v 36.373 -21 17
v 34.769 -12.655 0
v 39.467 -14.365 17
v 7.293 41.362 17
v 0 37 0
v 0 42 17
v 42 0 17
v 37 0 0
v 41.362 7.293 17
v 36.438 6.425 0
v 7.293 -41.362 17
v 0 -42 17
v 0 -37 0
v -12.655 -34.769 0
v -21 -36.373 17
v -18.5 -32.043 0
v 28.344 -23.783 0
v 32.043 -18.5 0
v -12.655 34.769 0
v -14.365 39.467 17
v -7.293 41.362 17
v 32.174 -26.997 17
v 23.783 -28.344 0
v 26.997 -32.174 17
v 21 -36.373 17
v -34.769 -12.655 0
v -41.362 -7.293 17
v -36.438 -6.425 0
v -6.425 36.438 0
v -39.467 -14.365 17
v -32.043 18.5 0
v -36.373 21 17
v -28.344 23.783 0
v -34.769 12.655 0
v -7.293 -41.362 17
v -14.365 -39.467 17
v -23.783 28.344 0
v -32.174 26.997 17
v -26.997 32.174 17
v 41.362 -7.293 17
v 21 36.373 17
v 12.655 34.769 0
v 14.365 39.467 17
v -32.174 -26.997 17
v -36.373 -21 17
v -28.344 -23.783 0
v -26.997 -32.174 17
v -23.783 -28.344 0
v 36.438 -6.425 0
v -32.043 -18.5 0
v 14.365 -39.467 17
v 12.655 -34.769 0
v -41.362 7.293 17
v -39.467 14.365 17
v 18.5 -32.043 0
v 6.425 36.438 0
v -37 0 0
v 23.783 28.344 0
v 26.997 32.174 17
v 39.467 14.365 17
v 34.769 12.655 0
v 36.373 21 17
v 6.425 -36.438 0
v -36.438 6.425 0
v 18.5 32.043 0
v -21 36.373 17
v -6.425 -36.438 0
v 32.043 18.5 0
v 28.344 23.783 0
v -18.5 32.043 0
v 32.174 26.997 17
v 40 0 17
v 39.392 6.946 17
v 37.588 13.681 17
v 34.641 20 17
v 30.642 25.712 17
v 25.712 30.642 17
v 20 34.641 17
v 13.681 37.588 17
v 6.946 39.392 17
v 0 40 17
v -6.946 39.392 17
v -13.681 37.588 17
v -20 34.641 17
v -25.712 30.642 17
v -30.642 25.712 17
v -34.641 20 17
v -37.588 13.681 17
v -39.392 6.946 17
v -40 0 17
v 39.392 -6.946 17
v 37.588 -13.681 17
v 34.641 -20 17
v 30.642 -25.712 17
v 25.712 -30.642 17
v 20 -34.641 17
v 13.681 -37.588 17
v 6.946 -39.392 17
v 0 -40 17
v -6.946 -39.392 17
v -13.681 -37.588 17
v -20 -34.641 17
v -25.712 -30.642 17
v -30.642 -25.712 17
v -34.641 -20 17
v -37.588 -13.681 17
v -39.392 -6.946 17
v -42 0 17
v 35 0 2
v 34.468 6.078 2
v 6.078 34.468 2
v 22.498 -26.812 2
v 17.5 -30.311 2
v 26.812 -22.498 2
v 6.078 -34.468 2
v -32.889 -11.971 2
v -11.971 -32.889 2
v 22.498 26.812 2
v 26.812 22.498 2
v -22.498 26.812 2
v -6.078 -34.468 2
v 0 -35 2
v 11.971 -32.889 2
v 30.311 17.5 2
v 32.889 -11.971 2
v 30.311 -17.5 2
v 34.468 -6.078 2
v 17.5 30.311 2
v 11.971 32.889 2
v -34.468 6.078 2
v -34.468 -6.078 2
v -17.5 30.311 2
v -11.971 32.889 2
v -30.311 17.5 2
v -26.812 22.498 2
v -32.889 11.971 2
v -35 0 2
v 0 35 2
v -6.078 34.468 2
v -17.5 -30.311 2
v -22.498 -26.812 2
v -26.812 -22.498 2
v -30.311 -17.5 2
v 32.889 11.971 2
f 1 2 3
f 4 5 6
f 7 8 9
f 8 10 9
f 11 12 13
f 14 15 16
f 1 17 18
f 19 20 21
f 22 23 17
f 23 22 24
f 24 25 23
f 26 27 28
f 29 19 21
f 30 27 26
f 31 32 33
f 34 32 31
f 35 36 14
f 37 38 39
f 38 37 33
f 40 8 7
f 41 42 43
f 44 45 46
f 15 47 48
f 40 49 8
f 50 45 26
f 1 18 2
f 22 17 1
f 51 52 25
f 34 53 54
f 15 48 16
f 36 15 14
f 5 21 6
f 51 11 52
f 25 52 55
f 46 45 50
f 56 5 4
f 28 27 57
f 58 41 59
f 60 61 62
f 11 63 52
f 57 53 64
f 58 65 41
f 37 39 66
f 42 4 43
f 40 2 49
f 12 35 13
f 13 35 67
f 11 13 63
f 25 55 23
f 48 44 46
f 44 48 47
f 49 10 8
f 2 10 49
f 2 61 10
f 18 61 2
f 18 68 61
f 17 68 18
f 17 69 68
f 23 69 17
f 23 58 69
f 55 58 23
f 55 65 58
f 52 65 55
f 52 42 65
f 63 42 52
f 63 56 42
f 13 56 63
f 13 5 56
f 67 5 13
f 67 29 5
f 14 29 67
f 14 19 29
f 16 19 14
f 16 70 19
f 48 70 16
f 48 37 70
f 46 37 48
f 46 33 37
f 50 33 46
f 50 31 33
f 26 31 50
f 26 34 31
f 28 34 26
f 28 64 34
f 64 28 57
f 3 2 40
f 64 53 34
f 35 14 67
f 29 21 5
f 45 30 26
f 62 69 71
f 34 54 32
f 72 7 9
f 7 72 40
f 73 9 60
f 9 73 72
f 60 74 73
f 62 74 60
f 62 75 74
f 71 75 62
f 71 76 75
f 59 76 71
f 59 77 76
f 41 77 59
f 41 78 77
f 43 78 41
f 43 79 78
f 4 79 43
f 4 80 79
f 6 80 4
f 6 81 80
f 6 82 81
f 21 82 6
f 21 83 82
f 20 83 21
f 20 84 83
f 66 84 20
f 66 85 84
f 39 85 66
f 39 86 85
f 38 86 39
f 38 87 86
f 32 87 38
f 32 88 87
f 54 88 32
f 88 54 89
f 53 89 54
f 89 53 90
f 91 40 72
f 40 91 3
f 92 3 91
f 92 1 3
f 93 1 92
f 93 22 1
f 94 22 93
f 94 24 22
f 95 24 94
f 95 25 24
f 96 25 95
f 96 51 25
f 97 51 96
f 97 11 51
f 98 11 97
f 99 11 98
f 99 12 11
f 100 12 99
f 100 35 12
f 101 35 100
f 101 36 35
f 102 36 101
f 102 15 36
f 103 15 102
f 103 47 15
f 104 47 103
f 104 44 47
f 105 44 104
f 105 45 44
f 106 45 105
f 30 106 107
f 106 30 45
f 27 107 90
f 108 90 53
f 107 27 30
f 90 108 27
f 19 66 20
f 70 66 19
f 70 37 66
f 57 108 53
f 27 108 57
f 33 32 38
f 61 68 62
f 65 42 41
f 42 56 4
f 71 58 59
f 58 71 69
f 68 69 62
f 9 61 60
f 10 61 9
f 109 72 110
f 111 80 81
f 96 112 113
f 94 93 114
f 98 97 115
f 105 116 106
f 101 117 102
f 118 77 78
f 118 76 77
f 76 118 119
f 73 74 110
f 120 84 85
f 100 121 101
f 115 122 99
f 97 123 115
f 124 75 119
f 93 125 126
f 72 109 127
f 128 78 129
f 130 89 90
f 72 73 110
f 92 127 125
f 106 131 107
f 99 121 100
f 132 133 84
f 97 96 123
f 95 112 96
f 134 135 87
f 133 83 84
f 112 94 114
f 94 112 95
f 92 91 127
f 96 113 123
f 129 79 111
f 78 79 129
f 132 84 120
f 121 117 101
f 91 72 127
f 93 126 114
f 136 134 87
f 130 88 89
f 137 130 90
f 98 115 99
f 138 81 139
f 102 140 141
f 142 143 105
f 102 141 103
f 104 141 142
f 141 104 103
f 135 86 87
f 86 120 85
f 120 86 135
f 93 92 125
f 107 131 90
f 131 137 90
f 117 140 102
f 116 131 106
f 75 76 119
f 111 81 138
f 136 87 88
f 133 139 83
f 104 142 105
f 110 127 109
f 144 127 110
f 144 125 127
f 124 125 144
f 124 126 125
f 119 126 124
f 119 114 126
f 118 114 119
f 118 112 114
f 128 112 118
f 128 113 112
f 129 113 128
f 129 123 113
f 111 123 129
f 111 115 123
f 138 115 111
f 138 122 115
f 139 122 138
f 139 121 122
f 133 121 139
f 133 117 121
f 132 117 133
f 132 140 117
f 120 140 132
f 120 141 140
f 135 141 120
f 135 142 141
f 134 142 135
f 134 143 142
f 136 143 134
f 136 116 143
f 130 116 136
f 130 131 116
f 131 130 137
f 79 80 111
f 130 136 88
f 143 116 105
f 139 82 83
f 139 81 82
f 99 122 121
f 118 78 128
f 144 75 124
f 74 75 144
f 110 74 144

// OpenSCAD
// these dimensions are for the inside of the container
height = 15;
base   = 70;
top    = 80;

wall   = 2;

$fn = 36;

difference(){
    cylinder(h = height + wall, d1 = base + (2*wall), d2 = top + (2*wall));
    translate([0,0,wall]){
        cylinder(h = height, d1 = base, d2 = top);
    }
}
